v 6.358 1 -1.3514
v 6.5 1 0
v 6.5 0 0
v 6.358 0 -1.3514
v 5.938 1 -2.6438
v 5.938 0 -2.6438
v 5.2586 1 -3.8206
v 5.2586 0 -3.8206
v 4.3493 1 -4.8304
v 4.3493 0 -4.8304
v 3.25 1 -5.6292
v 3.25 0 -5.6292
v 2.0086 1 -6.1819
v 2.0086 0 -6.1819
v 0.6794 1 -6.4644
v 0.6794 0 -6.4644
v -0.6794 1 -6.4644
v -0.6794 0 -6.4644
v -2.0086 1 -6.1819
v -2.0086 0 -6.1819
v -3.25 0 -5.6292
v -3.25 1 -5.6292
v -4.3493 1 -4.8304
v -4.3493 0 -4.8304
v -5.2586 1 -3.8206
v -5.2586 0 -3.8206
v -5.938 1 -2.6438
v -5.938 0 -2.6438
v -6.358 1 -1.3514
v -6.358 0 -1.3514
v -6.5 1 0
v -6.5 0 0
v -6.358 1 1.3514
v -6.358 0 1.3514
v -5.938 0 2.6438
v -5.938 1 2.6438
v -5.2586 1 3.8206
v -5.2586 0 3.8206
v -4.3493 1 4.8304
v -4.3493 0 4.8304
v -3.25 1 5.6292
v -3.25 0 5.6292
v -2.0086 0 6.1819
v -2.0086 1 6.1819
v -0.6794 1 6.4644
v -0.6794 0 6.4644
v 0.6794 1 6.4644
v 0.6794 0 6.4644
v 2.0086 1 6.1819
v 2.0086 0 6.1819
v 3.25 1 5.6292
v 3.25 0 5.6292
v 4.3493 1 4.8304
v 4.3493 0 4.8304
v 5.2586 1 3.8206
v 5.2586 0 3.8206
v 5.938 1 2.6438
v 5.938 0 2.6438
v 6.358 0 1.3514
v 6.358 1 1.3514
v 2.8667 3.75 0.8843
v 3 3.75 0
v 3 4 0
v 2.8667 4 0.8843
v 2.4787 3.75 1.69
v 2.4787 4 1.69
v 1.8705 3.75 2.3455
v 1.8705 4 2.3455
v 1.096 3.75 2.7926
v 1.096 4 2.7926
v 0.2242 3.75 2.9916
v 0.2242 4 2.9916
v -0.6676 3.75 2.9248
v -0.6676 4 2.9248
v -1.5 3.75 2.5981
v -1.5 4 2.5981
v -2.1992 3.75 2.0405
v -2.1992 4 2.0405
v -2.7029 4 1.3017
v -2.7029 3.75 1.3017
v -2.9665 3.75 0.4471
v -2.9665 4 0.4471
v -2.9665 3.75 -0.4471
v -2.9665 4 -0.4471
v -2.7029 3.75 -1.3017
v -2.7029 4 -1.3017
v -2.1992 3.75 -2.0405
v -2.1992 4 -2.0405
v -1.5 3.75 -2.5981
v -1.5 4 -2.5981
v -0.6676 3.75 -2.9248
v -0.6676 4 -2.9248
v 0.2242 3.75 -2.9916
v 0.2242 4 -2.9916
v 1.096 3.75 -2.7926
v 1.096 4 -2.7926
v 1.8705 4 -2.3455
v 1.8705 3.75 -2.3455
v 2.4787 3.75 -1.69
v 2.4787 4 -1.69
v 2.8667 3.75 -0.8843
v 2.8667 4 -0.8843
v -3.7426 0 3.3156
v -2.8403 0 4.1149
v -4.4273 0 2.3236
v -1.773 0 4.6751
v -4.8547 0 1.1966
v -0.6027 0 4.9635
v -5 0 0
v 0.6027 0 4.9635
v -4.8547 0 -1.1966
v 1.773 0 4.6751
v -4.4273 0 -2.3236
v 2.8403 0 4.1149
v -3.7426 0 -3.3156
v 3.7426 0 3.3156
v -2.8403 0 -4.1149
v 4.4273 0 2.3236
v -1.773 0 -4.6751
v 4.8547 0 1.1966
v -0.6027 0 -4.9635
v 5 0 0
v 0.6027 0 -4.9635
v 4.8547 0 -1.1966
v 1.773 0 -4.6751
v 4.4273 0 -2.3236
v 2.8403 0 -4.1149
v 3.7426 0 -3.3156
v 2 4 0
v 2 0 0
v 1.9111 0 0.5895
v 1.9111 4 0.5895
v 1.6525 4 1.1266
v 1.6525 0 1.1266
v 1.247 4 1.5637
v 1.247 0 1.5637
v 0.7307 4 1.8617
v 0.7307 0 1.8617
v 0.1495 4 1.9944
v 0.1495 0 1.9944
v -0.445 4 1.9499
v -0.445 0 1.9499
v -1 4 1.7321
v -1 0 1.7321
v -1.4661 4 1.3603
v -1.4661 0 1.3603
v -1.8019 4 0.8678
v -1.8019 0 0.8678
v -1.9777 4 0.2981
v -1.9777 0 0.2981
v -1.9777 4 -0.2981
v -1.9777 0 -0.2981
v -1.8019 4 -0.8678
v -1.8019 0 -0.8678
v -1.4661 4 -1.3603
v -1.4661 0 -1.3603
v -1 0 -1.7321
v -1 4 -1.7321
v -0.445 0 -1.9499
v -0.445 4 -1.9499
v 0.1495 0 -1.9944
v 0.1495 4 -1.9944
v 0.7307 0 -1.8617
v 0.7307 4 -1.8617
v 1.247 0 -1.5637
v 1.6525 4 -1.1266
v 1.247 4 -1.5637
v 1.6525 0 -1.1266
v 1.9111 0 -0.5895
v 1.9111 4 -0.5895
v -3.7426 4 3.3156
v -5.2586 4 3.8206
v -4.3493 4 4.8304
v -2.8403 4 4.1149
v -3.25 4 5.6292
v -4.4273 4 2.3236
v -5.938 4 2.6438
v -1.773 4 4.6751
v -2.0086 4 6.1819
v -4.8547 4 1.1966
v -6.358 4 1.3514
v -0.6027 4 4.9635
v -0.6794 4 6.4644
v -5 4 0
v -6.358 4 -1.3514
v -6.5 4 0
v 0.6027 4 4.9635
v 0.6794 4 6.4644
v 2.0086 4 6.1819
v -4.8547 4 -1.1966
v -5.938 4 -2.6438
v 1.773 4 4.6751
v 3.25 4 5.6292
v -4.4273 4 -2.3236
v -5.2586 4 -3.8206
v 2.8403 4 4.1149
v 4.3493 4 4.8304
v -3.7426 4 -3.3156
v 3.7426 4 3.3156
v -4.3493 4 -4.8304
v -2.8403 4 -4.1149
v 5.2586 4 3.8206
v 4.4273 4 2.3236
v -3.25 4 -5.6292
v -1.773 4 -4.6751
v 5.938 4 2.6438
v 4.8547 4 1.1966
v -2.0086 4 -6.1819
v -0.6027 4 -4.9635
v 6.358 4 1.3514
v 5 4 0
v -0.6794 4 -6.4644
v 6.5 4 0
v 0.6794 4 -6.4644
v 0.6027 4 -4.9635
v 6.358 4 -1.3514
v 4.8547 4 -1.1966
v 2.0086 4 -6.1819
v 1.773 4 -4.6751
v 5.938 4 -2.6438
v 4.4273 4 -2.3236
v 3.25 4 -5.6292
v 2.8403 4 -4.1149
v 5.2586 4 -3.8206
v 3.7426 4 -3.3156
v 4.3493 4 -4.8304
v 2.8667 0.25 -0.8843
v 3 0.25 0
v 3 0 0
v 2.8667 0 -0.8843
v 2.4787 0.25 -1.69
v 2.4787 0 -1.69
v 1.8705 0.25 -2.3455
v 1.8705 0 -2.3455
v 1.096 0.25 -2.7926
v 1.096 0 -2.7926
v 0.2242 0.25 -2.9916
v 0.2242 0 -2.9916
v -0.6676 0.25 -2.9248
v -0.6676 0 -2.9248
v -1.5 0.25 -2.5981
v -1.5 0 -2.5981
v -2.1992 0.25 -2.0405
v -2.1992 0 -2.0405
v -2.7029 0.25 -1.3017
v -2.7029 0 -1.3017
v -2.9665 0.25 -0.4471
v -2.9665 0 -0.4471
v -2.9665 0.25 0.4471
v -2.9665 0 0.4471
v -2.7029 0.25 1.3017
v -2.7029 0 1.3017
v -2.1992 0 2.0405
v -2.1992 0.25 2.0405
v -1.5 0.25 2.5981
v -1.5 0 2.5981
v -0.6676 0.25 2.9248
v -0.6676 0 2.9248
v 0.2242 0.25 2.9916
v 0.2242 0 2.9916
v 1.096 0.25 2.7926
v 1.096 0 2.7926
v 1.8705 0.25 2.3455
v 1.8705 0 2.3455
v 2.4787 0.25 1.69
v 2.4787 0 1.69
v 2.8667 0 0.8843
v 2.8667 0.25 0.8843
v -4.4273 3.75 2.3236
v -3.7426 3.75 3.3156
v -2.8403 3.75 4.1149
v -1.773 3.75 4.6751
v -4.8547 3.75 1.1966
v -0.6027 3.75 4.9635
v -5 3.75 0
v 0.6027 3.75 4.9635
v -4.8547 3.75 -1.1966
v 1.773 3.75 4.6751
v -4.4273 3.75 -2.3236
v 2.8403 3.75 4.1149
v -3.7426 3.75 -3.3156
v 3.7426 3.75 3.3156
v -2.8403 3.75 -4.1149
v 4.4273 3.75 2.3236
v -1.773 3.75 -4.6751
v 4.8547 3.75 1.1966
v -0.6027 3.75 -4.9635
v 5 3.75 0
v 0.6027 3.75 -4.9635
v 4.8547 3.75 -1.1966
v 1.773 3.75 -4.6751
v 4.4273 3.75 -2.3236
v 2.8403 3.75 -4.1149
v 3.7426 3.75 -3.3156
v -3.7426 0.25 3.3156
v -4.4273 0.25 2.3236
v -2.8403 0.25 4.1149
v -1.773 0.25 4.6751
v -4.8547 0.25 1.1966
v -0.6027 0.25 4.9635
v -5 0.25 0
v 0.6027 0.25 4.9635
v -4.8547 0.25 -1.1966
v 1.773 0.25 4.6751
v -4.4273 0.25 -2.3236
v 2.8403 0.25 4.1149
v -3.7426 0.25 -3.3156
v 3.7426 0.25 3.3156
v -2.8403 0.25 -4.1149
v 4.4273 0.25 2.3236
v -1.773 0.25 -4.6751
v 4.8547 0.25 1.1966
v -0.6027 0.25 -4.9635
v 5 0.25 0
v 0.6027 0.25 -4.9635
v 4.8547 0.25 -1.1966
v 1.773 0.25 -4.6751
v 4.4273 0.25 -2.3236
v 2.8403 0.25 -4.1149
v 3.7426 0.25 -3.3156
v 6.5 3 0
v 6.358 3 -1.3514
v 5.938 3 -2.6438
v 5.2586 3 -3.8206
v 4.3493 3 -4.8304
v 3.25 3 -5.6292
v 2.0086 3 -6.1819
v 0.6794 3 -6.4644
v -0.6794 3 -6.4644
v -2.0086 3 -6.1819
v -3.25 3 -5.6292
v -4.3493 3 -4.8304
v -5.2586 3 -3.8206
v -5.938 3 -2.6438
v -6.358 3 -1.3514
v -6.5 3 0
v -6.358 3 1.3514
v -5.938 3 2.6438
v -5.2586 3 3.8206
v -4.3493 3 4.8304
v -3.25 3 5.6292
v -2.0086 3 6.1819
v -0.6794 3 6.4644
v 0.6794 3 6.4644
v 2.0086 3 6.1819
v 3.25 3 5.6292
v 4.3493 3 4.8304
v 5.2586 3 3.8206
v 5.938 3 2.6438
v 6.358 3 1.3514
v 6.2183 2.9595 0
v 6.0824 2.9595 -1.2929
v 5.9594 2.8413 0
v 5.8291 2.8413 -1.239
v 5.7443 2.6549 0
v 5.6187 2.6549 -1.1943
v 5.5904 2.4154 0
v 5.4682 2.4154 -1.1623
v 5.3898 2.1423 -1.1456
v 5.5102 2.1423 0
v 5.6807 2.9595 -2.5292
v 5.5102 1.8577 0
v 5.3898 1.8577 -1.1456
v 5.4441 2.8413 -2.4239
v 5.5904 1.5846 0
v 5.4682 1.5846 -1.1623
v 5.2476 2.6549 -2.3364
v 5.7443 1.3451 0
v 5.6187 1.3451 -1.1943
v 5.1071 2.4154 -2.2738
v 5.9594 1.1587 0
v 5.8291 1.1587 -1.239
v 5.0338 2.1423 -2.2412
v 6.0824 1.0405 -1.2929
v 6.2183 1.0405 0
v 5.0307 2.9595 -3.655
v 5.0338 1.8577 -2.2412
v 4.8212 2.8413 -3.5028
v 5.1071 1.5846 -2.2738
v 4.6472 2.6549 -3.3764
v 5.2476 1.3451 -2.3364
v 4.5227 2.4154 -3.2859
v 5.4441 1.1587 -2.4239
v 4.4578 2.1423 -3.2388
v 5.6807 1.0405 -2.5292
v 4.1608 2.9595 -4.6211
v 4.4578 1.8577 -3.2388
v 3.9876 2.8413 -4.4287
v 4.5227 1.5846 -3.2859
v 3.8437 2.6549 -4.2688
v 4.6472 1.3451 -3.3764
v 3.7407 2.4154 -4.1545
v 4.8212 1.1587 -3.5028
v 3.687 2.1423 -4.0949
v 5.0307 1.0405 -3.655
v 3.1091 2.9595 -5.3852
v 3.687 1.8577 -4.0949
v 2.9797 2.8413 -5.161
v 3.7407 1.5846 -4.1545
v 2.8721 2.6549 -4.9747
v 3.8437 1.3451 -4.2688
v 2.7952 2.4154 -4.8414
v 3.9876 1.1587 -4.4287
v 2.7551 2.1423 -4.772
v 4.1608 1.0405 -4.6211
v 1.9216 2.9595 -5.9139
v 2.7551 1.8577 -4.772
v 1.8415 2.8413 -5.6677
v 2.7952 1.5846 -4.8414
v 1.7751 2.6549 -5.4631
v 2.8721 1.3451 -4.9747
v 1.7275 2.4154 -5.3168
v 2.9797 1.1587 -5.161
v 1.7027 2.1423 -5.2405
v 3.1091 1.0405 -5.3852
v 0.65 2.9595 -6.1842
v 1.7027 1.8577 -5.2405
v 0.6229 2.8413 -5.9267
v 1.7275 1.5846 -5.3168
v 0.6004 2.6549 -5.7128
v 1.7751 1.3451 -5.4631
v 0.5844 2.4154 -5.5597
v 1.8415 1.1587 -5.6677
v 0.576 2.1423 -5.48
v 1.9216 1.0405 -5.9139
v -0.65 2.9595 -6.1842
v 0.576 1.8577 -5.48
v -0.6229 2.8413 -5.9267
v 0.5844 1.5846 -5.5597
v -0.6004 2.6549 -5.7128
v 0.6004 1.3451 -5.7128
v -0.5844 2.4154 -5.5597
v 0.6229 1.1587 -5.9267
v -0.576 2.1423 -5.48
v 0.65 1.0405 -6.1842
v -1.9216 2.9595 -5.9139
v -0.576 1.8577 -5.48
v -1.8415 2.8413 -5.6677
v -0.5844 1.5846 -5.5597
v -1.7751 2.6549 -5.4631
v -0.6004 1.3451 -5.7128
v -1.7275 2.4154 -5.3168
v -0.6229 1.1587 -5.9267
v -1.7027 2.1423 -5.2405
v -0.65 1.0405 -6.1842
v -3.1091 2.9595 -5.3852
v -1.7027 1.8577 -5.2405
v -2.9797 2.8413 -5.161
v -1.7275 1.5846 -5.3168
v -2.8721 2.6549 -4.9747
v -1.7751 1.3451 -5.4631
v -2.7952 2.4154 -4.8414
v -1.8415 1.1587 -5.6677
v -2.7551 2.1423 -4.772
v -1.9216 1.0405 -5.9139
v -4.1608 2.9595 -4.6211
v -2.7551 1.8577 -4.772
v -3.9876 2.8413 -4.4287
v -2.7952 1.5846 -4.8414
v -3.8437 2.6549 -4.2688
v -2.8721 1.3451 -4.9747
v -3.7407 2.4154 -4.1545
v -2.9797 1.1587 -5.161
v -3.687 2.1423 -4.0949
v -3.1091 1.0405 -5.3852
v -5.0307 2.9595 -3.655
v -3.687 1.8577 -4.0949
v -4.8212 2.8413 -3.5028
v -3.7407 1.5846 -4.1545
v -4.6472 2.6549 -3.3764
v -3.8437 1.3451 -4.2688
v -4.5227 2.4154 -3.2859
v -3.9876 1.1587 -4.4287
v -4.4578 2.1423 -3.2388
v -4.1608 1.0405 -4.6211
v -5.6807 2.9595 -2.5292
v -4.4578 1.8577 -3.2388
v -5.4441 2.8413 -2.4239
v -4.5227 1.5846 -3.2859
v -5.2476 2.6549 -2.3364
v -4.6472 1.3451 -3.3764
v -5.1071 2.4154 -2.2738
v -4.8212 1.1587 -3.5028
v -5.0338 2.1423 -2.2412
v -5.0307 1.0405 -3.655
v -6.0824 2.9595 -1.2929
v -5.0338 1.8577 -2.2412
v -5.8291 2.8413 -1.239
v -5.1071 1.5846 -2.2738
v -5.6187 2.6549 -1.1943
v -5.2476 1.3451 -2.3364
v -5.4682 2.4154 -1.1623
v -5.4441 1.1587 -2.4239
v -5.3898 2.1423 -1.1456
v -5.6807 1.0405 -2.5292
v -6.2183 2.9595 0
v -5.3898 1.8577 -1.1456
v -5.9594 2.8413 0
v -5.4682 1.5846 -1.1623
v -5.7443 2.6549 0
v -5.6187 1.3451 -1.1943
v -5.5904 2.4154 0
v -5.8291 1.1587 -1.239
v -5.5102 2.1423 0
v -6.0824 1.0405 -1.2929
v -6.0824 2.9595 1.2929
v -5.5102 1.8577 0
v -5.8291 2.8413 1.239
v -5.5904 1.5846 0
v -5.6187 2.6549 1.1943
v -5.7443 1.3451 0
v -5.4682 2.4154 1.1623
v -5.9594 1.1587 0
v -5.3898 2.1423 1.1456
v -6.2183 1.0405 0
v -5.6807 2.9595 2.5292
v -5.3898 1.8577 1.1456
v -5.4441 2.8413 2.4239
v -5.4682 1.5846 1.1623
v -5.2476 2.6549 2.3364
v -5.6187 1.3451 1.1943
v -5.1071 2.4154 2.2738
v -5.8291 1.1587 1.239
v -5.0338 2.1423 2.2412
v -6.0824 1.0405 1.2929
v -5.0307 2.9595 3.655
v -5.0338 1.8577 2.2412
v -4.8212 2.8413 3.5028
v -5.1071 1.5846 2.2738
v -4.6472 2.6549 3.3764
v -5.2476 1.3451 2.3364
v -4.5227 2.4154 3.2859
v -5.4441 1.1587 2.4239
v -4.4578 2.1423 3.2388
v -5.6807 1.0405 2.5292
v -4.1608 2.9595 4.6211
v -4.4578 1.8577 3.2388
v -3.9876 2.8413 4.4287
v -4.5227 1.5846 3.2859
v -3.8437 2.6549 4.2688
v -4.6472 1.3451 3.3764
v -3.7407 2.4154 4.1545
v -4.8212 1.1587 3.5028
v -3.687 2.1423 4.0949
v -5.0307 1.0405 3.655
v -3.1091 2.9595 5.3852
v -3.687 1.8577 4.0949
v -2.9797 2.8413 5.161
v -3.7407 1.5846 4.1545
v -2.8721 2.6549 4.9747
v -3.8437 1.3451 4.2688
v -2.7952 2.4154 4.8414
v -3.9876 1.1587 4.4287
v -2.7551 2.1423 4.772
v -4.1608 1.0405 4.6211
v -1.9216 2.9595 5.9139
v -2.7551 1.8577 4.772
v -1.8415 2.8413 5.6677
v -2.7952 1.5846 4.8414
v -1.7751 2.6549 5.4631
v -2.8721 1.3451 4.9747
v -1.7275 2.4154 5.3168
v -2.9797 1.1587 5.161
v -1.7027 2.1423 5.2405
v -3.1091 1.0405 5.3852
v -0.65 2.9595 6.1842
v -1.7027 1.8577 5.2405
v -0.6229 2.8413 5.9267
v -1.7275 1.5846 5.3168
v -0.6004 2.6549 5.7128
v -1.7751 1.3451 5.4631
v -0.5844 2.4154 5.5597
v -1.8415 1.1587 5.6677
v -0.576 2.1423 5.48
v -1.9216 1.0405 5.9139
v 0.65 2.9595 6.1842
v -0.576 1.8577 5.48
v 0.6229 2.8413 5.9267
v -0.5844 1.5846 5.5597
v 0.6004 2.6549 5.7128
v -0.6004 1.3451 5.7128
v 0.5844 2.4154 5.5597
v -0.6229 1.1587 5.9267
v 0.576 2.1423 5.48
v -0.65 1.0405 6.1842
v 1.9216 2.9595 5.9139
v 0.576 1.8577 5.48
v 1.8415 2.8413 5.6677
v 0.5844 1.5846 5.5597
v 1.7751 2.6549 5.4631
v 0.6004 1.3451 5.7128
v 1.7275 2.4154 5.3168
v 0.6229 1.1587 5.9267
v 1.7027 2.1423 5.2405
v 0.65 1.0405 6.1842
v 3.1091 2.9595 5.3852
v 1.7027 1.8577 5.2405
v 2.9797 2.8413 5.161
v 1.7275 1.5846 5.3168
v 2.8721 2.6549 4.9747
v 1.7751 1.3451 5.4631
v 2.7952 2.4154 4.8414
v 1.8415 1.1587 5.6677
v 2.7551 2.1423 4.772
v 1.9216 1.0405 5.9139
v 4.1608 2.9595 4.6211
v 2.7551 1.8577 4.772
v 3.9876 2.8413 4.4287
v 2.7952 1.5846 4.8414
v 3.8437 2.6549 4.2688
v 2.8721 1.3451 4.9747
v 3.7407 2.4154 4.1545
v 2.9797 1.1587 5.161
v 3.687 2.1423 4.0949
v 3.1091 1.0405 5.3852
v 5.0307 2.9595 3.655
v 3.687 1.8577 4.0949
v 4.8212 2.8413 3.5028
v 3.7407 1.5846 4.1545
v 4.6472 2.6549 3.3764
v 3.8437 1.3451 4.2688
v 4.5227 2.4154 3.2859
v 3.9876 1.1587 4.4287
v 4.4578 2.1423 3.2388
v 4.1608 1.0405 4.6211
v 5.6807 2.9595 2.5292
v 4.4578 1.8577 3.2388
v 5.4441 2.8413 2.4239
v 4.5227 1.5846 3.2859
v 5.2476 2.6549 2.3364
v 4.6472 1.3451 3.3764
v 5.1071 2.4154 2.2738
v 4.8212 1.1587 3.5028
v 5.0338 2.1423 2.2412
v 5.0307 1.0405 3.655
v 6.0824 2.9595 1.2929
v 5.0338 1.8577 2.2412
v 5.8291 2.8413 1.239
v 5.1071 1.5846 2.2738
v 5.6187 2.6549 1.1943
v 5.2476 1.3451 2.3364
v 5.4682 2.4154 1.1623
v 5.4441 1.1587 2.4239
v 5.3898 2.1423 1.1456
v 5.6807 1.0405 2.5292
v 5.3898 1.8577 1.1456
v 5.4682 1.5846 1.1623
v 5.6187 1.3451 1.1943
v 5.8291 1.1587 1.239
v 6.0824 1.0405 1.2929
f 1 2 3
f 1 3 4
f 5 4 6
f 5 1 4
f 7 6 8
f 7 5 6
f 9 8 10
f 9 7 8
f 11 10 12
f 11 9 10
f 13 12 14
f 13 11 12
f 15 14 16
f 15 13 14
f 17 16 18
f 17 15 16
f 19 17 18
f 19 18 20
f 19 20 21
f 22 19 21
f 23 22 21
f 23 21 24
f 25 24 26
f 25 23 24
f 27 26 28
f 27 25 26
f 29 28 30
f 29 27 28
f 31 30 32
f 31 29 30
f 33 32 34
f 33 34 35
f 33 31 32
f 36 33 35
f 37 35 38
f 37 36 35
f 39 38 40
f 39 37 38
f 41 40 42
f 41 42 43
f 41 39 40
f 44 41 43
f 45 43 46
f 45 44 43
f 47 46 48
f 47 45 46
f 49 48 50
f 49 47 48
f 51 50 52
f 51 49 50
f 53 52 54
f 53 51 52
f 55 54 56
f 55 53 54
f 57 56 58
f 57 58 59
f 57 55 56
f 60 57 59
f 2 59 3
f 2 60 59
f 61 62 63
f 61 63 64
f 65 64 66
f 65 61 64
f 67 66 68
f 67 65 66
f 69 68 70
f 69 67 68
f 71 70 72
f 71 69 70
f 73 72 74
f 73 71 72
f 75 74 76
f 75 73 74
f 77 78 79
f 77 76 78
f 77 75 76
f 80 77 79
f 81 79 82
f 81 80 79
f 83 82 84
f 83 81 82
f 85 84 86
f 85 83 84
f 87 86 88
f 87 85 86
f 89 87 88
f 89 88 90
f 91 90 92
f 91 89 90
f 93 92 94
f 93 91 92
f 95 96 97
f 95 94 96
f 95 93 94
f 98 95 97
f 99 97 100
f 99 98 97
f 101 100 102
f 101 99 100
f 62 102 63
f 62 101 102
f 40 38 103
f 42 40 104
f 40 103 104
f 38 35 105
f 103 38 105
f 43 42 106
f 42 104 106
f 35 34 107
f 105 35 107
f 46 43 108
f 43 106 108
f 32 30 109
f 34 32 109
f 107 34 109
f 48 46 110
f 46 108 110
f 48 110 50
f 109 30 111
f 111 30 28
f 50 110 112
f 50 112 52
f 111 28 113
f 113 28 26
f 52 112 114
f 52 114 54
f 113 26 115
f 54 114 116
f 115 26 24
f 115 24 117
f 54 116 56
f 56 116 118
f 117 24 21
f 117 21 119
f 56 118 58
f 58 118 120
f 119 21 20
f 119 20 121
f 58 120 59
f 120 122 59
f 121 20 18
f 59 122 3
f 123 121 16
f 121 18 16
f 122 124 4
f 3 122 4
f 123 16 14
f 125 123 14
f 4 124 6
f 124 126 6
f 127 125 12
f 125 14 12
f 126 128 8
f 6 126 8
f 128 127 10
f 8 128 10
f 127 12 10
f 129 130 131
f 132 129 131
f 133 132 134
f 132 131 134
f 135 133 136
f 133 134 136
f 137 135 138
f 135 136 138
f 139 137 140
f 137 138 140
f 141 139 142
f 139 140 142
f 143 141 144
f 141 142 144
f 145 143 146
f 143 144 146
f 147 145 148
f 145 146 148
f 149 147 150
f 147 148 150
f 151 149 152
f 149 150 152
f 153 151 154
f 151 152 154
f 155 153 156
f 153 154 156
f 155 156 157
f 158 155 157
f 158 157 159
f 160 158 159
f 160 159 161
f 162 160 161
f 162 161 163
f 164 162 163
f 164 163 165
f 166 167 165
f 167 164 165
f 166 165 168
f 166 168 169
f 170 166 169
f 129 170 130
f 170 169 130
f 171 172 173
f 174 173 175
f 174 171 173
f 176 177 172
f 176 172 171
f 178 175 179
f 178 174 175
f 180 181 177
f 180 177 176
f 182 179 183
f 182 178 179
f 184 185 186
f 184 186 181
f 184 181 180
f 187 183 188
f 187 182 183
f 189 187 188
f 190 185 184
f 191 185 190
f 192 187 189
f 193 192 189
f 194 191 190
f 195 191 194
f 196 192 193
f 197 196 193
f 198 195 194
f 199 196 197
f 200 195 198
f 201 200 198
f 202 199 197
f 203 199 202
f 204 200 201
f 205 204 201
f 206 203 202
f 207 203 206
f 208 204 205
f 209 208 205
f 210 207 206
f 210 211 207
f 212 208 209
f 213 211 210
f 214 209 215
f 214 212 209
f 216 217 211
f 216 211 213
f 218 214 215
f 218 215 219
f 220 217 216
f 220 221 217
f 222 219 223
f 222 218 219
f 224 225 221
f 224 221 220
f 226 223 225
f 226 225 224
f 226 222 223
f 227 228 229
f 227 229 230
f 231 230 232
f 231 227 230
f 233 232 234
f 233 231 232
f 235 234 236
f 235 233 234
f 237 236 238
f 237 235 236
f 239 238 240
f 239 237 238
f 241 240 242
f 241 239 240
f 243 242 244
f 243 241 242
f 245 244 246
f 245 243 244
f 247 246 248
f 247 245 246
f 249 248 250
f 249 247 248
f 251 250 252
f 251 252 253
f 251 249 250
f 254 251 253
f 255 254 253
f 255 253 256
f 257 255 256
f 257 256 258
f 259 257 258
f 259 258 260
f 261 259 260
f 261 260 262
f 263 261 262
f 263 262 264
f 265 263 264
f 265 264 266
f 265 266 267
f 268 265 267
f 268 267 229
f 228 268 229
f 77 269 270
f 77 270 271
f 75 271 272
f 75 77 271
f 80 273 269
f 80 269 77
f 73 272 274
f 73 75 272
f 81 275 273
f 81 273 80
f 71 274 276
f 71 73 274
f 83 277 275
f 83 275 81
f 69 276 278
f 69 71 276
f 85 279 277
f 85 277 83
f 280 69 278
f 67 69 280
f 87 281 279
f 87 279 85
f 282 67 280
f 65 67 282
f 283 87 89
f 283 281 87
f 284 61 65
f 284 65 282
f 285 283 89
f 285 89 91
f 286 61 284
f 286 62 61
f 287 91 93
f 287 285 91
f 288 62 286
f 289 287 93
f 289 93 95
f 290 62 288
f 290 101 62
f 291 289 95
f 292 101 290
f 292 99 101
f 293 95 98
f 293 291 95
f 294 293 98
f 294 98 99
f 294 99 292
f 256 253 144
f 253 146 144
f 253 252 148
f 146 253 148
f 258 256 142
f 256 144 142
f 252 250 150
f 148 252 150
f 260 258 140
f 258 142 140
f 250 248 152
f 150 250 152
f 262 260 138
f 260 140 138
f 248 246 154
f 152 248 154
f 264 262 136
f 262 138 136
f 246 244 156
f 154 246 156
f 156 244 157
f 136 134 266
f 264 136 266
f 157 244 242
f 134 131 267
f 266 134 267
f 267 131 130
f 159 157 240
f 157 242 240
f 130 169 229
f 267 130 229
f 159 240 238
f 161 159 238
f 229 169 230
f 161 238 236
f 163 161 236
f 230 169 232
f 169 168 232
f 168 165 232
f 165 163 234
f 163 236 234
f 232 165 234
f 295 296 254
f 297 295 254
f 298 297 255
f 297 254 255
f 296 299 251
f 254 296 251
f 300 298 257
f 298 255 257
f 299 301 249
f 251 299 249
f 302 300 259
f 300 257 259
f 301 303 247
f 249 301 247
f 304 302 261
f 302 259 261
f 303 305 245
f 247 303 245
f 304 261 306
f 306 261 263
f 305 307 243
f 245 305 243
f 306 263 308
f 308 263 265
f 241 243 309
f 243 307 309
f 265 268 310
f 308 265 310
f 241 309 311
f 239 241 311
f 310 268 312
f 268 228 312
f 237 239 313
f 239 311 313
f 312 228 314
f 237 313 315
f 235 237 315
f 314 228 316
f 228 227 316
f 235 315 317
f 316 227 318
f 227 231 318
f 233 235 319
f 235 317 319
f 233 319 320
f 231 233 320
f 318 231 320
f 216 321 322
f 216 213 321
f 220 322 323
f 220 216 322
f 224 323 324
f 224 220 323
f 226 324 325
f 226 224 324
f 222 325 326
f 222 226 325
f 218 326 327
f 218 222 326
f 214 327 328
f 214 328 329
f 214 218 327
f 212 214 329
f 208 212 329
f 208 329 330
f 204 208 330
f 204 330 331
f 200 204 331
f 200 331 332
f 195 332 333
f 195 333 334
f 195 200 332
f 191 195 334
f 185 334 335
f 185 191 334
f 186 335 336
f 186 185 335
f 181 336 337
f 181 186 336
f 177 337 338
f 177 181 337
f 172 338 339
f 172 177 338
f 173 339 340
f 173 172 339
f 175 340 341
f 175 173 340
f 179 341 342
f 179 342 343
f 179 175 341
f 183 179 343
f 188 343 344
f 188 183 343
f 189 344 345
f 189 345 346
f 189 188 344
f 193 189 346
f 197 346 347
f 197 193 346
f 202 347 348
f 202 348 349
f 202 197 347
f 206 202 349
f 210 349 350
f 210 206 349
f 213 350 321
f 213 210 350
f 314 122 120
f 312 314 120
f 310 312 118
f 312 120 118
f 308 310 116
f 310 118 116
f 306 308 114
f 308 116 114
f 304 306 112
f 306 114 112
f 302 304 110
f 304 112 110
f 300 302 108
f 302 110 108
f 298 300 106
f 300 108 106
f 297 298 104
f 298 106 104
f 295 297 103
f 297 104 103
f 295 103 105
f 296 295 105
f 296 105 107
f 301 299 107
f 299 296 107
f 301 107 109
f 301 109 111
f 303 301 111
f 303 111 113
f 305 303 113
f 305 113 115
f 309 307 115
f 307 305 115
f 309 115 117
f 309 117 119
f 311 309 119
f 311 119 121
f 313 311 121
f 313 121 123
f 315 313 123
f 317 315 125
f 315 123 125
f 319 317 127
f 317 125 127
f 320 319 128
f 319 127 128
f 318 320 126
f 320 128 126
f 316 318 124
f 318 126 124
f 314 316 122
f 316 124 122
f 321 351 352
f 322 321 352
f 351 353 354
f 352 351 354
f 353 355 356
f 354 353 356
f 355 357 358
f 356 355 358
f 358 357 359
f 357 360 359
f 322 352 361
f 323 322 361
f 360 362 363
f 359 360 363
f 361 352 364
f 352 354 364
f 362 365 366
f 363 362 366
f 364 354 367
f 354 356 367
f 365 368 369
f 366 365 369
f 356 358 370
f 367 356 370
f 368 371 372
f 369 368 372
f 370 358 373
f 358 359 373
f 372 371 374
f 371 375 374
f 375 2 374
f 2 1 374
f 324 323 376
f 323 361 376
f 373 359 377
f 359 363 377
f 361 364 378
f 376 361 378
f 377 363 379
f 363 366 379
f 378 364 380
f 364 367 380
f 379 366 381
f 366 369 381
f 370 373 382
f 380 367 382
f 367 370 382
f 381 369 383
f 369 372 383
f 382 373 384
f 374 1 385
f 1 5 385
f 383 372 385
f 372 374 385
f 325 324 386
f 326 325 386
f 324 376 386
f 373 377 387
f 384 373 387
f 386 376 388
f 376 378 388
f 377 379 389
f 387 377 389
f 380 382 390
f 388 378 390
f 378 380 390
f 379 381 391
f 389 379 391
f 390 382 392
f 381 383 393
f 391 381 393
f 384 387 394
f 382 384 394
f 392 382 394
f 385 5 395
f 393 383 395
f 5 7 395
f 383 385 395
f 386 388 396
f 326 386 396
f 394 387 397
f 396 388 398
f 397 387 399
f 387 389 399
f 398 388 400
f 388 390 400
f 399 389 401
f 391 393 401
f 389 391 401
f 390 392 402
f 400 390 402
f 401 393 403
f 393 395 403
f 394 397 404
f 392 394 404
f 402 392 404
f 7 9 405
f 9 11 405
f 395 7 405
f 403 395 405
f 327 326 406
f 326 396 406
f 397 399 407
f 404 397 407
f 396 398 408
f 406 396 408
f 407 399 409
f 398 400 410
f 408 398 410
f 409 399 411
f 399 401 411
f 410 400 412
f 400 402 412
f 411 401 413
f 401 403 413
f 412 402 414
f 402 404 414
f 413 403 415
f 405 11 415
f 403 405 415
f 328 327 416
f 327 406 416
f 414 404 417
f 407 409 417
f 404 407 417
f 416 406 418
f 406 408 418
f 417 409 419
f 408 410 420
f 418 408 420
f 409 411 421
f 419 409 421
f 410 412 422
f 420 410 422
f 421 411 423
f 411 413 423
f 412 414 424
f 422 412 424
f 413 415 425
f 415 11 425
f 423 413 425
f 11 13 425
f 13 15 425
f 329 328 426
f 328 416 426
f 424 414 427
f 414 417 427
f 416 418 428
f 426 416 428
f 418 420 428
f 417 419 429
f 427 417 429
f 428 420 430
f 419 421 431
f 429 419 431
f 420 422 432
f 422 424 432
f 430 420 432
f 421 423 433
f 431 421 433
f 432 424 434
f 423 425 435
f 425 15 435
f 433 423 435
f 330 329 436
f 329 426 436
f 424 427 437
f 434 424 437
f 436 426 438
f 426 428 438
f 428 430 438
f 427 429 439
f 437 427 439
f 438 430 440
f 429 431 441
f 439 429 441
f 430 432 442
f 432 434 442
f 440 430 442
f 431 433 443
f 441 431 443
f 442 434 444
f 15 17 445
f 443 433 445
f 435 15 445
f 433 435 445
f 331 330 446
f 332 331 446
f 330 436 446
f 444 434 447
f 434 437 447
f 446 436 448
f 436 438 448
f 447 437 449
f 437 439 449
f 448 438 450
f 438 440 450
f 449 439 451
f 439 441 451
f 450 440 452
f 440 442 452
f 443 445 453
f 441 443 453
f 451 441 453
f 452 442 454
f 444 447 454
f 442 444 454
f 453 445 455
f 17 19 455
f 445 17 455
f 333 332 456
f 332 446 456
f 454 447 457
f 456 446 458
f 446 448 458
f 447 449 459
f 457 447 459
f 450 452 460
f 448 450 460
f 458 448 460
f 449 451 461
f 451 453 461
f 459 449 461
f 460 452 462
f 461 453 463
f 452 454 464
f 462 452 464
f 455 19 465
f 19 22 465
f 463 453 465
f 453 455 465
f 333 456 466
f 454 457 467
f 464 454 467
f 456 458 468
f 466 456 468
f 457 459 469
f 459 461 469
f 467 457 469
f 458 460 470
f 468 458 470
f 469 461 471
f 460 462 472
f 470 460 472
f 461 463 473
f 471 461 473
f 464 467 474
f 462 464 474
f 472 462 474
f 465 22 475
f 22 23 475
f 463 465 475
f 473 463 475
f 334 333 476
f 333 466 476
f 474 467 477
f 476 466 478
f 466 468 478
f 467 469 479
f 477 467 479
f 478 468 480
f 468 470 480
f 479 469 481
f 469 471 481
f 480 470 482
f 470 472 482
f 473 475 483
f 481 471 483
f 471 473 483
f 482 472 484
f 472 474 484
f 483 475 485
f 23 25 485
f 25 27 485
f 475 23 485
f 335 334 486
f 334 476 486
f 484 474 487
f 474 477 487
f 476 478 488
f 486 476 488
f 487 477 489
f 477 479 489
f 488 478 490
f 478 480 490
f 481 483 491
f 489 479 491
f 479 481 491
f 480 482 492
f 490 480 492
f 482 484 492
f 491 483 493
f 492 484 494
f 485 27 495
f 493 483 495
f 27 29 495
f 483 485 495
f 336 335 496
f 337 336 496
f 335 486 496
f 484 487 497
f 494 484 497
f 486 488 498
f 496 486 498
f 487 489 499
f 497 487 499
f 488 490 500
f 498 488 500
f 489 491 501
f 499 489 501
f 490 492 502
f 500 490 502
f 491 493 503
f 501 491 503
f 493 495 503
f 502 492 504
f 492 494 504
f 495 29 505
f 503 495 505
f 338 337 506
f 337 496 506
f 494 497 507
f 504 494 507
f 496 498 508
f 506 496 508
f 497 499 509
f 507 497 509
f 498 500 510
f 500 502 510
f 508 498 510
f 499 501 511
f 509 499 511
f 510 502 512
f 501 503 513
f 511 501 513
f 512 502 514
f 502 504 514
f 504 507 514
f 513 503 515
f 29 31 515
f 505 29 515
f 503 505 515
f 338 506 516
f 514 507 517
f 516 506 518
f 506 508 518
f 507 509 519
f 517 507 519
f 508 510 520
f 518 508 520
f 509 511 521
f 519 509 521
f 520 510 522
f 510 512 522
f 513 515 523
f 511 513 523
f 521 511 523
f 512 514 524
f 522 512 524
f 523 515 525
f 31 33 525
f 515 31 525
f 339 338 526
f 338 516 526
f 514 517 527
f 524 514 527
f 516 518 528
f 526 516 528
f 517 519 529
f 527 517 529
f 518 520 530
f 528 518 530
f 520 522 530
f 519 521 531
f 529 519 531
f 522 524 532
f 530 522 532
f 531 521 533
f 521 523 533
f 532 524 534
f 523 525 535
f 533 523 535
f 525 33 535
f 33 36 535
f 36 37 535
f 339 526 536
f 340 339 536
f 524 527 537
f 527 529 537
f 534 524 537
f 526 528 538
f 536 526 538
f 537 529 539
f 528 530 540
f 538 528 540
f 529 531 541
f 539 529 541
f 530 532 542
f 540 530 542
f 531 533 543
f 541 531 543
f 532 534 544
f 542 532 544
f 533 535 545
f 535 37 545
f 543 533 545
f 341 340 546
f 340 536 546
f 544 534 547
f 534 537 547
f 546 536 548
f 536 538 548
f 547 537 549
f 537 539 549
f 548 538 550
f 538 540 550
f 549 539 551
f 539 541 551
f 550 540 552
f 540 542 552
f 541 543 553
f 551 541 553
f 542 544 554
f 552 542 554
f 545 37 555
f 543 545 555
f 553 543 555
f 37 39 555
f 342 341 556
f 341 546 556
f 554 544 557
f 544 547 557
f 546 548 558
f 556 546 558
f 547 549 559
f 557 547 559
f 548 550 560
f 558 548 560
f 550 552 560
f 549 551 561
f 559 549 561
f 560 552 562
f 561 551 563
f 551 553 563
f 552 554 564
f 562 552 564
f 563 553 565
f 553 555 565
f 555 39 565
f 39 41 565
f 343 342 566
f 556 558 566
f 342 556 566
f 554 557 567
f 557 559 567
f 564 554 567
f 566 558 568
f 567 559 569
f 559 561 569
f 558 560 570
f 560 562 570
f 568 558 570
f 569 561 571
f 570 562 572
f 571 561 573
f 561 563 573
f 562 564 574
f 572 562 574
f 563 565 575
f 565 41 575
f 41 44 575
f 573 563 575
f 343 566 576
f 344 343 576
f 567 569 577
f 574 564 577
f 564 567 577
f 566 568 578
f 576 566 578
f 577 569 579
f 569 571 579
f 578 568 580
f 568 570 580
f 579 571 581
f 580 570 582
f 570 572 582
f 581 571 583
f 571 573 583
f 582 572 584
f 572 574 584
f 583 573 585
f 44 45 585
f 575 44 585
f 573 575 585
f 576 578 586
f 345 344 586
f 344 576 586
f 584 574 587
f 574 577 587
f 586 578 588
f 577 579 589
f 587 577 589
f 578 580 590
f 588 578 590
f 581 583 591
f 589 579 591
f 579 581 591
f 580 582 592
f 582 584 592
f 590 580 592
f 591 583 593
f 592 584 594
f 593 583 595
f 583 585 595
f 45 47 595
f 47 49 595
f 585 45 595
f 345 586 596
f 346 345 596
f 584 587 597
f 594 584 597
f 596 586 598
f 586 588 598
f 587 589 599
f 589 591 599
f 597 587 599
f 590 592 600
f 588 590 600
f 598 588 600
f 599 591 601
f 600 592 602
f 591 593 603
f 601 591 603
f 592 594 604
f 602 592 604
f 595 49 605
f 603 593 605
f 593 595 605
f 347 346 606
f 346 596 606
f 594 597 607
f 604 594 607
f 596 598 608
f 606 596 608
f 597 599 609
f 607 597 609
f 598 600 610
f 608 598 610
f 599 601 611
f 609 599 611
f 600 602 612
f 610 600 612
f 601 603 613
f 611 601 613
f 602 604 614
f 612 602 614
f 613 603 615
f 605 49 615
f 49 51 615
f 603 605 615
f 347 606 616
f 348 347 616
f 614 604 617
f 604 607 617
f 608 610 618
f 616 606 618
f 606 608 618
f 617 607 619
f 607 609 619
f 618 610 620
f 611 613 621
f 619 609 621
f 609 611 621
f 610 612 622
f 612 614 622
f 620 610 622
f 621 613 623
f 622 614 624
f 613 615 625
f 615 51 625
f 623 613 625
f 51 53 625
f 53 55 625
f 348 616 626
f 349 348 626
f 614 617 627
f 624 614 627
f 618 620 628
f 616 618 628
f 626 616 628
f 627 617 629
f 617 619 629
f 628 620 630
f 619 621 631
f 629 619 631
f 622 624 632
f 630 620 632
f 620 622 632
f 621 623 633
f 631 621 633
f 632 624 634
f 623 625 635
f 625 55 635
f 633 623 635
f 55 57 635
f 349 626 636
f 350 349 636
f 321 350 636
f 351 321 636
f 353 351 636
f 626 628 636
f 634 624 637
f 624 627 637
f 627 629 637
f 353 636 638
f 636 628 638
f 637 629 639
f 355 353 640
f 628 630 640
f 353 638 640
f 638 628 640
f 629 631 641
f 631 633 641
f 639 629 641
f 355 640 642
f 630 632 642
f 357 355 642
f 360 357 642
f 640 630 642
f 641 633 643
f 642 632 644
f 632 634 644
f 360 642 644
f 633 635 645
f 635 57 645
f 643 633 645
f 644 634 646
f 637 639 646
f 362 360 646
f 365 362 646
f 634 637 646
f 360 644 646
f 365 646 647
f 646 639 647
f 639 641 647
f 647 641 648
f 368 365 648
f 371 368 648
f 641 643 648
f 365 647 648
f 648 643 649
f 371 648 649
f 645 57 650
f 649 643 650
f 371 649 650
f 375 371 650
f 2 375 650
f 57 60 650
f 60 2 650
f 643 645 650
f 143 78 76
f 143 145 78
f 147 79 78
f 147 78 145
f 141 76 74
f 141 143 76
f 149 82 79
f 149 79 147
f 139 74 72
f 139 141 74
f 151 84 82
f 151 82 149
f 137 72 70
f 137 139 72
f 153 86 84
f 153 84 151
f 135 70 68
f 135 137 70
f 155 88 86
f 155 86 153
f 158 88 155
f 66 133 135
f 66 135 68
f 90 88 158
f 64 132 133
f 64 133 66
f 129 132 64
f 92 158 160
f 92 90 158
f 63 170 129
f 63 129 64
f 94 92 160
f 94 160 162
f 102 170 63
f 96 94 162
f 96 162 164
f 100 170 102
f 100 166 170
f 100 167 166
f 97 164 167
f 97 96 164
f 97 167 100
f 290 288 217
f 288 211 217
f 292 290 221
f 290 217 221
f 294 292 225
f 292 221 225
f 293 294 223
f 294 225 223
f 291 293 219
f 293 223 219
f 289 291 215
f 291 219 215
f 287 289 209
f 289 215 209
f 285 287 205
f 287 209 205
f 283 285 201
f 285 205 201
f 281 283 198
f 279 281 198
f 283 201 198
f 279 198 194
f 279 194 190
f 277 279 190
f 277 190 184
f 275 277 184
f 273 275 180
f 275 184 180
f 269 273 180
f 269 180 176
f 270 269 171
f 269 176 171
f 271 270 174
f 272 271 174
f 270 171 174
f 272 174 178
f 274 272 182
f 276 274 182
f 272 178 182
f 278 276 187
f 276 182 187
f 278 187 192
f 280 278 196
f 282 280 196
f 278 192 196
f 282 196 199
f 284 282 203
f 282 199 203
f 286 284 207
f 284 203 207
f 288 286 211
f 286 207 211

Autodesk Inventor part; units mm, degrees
ref_plane "YZ Plane" through (0, 0, 0) normal (1, 0, 0) x (0, 1, 0)
ref_plane "XZ Plane" through (0, 0, 0) normal (0, 1, 0) x (-1, 0, 0)
ref_plane "XY Plane" through (0, 0, 0) normal (0, 0, 1) x (1, 0, 0)
sketch "Sketch1" plane through (0, 0, 0) normal (0, 0, 1) x (1, 0, 0)
  line L0 (0, 0) -> (0, 5.0023) construction
  line L1 (2, 0) -> (6.5, 0)
  line L2 (6.5, 0) -> (6.5, 4)
  line L3 (6.5, 4) -> (2, 4)
  line L4 (2, 4) -> (2, 0)
  circle A0 centre (6.5, 2) radius 1
  line L5 (3, 4) -> (3, 3.75)
  line L6 (3, 3.75) -> (5, 3.75)
  line L7 (5, 3.75) -> (5, 4)
  line L8 (3, 0) -> (3, 0.25)
  line L9 (3, 0.25) -> (5, 0.25)
  line L10 (5, 0.25) -> (5, 0)
  point P0 (0, 2.5011)
  point P1 (6.5, 1)
  point P2 (6.5, 3)
  point P3 (3, 3.875)
  dimension "d0" = 2
  dimension "d1" = 2
  dimension "d2" = 6.5
  dimension "d3" = 4
  dimension "d5" = 0.25
  dimension "d6" = 1
  dimension "d7" = 2
revolve "Revolution1" add sketch "Sketch1" angle 360 about axis through (0, 0, 0) along (0, 1, 0) contours L4 L3 L5 L6 L7 L2 A0 L1 L10 L9 L8
properties part number "BearingU604" material "Steel, Alloy"
